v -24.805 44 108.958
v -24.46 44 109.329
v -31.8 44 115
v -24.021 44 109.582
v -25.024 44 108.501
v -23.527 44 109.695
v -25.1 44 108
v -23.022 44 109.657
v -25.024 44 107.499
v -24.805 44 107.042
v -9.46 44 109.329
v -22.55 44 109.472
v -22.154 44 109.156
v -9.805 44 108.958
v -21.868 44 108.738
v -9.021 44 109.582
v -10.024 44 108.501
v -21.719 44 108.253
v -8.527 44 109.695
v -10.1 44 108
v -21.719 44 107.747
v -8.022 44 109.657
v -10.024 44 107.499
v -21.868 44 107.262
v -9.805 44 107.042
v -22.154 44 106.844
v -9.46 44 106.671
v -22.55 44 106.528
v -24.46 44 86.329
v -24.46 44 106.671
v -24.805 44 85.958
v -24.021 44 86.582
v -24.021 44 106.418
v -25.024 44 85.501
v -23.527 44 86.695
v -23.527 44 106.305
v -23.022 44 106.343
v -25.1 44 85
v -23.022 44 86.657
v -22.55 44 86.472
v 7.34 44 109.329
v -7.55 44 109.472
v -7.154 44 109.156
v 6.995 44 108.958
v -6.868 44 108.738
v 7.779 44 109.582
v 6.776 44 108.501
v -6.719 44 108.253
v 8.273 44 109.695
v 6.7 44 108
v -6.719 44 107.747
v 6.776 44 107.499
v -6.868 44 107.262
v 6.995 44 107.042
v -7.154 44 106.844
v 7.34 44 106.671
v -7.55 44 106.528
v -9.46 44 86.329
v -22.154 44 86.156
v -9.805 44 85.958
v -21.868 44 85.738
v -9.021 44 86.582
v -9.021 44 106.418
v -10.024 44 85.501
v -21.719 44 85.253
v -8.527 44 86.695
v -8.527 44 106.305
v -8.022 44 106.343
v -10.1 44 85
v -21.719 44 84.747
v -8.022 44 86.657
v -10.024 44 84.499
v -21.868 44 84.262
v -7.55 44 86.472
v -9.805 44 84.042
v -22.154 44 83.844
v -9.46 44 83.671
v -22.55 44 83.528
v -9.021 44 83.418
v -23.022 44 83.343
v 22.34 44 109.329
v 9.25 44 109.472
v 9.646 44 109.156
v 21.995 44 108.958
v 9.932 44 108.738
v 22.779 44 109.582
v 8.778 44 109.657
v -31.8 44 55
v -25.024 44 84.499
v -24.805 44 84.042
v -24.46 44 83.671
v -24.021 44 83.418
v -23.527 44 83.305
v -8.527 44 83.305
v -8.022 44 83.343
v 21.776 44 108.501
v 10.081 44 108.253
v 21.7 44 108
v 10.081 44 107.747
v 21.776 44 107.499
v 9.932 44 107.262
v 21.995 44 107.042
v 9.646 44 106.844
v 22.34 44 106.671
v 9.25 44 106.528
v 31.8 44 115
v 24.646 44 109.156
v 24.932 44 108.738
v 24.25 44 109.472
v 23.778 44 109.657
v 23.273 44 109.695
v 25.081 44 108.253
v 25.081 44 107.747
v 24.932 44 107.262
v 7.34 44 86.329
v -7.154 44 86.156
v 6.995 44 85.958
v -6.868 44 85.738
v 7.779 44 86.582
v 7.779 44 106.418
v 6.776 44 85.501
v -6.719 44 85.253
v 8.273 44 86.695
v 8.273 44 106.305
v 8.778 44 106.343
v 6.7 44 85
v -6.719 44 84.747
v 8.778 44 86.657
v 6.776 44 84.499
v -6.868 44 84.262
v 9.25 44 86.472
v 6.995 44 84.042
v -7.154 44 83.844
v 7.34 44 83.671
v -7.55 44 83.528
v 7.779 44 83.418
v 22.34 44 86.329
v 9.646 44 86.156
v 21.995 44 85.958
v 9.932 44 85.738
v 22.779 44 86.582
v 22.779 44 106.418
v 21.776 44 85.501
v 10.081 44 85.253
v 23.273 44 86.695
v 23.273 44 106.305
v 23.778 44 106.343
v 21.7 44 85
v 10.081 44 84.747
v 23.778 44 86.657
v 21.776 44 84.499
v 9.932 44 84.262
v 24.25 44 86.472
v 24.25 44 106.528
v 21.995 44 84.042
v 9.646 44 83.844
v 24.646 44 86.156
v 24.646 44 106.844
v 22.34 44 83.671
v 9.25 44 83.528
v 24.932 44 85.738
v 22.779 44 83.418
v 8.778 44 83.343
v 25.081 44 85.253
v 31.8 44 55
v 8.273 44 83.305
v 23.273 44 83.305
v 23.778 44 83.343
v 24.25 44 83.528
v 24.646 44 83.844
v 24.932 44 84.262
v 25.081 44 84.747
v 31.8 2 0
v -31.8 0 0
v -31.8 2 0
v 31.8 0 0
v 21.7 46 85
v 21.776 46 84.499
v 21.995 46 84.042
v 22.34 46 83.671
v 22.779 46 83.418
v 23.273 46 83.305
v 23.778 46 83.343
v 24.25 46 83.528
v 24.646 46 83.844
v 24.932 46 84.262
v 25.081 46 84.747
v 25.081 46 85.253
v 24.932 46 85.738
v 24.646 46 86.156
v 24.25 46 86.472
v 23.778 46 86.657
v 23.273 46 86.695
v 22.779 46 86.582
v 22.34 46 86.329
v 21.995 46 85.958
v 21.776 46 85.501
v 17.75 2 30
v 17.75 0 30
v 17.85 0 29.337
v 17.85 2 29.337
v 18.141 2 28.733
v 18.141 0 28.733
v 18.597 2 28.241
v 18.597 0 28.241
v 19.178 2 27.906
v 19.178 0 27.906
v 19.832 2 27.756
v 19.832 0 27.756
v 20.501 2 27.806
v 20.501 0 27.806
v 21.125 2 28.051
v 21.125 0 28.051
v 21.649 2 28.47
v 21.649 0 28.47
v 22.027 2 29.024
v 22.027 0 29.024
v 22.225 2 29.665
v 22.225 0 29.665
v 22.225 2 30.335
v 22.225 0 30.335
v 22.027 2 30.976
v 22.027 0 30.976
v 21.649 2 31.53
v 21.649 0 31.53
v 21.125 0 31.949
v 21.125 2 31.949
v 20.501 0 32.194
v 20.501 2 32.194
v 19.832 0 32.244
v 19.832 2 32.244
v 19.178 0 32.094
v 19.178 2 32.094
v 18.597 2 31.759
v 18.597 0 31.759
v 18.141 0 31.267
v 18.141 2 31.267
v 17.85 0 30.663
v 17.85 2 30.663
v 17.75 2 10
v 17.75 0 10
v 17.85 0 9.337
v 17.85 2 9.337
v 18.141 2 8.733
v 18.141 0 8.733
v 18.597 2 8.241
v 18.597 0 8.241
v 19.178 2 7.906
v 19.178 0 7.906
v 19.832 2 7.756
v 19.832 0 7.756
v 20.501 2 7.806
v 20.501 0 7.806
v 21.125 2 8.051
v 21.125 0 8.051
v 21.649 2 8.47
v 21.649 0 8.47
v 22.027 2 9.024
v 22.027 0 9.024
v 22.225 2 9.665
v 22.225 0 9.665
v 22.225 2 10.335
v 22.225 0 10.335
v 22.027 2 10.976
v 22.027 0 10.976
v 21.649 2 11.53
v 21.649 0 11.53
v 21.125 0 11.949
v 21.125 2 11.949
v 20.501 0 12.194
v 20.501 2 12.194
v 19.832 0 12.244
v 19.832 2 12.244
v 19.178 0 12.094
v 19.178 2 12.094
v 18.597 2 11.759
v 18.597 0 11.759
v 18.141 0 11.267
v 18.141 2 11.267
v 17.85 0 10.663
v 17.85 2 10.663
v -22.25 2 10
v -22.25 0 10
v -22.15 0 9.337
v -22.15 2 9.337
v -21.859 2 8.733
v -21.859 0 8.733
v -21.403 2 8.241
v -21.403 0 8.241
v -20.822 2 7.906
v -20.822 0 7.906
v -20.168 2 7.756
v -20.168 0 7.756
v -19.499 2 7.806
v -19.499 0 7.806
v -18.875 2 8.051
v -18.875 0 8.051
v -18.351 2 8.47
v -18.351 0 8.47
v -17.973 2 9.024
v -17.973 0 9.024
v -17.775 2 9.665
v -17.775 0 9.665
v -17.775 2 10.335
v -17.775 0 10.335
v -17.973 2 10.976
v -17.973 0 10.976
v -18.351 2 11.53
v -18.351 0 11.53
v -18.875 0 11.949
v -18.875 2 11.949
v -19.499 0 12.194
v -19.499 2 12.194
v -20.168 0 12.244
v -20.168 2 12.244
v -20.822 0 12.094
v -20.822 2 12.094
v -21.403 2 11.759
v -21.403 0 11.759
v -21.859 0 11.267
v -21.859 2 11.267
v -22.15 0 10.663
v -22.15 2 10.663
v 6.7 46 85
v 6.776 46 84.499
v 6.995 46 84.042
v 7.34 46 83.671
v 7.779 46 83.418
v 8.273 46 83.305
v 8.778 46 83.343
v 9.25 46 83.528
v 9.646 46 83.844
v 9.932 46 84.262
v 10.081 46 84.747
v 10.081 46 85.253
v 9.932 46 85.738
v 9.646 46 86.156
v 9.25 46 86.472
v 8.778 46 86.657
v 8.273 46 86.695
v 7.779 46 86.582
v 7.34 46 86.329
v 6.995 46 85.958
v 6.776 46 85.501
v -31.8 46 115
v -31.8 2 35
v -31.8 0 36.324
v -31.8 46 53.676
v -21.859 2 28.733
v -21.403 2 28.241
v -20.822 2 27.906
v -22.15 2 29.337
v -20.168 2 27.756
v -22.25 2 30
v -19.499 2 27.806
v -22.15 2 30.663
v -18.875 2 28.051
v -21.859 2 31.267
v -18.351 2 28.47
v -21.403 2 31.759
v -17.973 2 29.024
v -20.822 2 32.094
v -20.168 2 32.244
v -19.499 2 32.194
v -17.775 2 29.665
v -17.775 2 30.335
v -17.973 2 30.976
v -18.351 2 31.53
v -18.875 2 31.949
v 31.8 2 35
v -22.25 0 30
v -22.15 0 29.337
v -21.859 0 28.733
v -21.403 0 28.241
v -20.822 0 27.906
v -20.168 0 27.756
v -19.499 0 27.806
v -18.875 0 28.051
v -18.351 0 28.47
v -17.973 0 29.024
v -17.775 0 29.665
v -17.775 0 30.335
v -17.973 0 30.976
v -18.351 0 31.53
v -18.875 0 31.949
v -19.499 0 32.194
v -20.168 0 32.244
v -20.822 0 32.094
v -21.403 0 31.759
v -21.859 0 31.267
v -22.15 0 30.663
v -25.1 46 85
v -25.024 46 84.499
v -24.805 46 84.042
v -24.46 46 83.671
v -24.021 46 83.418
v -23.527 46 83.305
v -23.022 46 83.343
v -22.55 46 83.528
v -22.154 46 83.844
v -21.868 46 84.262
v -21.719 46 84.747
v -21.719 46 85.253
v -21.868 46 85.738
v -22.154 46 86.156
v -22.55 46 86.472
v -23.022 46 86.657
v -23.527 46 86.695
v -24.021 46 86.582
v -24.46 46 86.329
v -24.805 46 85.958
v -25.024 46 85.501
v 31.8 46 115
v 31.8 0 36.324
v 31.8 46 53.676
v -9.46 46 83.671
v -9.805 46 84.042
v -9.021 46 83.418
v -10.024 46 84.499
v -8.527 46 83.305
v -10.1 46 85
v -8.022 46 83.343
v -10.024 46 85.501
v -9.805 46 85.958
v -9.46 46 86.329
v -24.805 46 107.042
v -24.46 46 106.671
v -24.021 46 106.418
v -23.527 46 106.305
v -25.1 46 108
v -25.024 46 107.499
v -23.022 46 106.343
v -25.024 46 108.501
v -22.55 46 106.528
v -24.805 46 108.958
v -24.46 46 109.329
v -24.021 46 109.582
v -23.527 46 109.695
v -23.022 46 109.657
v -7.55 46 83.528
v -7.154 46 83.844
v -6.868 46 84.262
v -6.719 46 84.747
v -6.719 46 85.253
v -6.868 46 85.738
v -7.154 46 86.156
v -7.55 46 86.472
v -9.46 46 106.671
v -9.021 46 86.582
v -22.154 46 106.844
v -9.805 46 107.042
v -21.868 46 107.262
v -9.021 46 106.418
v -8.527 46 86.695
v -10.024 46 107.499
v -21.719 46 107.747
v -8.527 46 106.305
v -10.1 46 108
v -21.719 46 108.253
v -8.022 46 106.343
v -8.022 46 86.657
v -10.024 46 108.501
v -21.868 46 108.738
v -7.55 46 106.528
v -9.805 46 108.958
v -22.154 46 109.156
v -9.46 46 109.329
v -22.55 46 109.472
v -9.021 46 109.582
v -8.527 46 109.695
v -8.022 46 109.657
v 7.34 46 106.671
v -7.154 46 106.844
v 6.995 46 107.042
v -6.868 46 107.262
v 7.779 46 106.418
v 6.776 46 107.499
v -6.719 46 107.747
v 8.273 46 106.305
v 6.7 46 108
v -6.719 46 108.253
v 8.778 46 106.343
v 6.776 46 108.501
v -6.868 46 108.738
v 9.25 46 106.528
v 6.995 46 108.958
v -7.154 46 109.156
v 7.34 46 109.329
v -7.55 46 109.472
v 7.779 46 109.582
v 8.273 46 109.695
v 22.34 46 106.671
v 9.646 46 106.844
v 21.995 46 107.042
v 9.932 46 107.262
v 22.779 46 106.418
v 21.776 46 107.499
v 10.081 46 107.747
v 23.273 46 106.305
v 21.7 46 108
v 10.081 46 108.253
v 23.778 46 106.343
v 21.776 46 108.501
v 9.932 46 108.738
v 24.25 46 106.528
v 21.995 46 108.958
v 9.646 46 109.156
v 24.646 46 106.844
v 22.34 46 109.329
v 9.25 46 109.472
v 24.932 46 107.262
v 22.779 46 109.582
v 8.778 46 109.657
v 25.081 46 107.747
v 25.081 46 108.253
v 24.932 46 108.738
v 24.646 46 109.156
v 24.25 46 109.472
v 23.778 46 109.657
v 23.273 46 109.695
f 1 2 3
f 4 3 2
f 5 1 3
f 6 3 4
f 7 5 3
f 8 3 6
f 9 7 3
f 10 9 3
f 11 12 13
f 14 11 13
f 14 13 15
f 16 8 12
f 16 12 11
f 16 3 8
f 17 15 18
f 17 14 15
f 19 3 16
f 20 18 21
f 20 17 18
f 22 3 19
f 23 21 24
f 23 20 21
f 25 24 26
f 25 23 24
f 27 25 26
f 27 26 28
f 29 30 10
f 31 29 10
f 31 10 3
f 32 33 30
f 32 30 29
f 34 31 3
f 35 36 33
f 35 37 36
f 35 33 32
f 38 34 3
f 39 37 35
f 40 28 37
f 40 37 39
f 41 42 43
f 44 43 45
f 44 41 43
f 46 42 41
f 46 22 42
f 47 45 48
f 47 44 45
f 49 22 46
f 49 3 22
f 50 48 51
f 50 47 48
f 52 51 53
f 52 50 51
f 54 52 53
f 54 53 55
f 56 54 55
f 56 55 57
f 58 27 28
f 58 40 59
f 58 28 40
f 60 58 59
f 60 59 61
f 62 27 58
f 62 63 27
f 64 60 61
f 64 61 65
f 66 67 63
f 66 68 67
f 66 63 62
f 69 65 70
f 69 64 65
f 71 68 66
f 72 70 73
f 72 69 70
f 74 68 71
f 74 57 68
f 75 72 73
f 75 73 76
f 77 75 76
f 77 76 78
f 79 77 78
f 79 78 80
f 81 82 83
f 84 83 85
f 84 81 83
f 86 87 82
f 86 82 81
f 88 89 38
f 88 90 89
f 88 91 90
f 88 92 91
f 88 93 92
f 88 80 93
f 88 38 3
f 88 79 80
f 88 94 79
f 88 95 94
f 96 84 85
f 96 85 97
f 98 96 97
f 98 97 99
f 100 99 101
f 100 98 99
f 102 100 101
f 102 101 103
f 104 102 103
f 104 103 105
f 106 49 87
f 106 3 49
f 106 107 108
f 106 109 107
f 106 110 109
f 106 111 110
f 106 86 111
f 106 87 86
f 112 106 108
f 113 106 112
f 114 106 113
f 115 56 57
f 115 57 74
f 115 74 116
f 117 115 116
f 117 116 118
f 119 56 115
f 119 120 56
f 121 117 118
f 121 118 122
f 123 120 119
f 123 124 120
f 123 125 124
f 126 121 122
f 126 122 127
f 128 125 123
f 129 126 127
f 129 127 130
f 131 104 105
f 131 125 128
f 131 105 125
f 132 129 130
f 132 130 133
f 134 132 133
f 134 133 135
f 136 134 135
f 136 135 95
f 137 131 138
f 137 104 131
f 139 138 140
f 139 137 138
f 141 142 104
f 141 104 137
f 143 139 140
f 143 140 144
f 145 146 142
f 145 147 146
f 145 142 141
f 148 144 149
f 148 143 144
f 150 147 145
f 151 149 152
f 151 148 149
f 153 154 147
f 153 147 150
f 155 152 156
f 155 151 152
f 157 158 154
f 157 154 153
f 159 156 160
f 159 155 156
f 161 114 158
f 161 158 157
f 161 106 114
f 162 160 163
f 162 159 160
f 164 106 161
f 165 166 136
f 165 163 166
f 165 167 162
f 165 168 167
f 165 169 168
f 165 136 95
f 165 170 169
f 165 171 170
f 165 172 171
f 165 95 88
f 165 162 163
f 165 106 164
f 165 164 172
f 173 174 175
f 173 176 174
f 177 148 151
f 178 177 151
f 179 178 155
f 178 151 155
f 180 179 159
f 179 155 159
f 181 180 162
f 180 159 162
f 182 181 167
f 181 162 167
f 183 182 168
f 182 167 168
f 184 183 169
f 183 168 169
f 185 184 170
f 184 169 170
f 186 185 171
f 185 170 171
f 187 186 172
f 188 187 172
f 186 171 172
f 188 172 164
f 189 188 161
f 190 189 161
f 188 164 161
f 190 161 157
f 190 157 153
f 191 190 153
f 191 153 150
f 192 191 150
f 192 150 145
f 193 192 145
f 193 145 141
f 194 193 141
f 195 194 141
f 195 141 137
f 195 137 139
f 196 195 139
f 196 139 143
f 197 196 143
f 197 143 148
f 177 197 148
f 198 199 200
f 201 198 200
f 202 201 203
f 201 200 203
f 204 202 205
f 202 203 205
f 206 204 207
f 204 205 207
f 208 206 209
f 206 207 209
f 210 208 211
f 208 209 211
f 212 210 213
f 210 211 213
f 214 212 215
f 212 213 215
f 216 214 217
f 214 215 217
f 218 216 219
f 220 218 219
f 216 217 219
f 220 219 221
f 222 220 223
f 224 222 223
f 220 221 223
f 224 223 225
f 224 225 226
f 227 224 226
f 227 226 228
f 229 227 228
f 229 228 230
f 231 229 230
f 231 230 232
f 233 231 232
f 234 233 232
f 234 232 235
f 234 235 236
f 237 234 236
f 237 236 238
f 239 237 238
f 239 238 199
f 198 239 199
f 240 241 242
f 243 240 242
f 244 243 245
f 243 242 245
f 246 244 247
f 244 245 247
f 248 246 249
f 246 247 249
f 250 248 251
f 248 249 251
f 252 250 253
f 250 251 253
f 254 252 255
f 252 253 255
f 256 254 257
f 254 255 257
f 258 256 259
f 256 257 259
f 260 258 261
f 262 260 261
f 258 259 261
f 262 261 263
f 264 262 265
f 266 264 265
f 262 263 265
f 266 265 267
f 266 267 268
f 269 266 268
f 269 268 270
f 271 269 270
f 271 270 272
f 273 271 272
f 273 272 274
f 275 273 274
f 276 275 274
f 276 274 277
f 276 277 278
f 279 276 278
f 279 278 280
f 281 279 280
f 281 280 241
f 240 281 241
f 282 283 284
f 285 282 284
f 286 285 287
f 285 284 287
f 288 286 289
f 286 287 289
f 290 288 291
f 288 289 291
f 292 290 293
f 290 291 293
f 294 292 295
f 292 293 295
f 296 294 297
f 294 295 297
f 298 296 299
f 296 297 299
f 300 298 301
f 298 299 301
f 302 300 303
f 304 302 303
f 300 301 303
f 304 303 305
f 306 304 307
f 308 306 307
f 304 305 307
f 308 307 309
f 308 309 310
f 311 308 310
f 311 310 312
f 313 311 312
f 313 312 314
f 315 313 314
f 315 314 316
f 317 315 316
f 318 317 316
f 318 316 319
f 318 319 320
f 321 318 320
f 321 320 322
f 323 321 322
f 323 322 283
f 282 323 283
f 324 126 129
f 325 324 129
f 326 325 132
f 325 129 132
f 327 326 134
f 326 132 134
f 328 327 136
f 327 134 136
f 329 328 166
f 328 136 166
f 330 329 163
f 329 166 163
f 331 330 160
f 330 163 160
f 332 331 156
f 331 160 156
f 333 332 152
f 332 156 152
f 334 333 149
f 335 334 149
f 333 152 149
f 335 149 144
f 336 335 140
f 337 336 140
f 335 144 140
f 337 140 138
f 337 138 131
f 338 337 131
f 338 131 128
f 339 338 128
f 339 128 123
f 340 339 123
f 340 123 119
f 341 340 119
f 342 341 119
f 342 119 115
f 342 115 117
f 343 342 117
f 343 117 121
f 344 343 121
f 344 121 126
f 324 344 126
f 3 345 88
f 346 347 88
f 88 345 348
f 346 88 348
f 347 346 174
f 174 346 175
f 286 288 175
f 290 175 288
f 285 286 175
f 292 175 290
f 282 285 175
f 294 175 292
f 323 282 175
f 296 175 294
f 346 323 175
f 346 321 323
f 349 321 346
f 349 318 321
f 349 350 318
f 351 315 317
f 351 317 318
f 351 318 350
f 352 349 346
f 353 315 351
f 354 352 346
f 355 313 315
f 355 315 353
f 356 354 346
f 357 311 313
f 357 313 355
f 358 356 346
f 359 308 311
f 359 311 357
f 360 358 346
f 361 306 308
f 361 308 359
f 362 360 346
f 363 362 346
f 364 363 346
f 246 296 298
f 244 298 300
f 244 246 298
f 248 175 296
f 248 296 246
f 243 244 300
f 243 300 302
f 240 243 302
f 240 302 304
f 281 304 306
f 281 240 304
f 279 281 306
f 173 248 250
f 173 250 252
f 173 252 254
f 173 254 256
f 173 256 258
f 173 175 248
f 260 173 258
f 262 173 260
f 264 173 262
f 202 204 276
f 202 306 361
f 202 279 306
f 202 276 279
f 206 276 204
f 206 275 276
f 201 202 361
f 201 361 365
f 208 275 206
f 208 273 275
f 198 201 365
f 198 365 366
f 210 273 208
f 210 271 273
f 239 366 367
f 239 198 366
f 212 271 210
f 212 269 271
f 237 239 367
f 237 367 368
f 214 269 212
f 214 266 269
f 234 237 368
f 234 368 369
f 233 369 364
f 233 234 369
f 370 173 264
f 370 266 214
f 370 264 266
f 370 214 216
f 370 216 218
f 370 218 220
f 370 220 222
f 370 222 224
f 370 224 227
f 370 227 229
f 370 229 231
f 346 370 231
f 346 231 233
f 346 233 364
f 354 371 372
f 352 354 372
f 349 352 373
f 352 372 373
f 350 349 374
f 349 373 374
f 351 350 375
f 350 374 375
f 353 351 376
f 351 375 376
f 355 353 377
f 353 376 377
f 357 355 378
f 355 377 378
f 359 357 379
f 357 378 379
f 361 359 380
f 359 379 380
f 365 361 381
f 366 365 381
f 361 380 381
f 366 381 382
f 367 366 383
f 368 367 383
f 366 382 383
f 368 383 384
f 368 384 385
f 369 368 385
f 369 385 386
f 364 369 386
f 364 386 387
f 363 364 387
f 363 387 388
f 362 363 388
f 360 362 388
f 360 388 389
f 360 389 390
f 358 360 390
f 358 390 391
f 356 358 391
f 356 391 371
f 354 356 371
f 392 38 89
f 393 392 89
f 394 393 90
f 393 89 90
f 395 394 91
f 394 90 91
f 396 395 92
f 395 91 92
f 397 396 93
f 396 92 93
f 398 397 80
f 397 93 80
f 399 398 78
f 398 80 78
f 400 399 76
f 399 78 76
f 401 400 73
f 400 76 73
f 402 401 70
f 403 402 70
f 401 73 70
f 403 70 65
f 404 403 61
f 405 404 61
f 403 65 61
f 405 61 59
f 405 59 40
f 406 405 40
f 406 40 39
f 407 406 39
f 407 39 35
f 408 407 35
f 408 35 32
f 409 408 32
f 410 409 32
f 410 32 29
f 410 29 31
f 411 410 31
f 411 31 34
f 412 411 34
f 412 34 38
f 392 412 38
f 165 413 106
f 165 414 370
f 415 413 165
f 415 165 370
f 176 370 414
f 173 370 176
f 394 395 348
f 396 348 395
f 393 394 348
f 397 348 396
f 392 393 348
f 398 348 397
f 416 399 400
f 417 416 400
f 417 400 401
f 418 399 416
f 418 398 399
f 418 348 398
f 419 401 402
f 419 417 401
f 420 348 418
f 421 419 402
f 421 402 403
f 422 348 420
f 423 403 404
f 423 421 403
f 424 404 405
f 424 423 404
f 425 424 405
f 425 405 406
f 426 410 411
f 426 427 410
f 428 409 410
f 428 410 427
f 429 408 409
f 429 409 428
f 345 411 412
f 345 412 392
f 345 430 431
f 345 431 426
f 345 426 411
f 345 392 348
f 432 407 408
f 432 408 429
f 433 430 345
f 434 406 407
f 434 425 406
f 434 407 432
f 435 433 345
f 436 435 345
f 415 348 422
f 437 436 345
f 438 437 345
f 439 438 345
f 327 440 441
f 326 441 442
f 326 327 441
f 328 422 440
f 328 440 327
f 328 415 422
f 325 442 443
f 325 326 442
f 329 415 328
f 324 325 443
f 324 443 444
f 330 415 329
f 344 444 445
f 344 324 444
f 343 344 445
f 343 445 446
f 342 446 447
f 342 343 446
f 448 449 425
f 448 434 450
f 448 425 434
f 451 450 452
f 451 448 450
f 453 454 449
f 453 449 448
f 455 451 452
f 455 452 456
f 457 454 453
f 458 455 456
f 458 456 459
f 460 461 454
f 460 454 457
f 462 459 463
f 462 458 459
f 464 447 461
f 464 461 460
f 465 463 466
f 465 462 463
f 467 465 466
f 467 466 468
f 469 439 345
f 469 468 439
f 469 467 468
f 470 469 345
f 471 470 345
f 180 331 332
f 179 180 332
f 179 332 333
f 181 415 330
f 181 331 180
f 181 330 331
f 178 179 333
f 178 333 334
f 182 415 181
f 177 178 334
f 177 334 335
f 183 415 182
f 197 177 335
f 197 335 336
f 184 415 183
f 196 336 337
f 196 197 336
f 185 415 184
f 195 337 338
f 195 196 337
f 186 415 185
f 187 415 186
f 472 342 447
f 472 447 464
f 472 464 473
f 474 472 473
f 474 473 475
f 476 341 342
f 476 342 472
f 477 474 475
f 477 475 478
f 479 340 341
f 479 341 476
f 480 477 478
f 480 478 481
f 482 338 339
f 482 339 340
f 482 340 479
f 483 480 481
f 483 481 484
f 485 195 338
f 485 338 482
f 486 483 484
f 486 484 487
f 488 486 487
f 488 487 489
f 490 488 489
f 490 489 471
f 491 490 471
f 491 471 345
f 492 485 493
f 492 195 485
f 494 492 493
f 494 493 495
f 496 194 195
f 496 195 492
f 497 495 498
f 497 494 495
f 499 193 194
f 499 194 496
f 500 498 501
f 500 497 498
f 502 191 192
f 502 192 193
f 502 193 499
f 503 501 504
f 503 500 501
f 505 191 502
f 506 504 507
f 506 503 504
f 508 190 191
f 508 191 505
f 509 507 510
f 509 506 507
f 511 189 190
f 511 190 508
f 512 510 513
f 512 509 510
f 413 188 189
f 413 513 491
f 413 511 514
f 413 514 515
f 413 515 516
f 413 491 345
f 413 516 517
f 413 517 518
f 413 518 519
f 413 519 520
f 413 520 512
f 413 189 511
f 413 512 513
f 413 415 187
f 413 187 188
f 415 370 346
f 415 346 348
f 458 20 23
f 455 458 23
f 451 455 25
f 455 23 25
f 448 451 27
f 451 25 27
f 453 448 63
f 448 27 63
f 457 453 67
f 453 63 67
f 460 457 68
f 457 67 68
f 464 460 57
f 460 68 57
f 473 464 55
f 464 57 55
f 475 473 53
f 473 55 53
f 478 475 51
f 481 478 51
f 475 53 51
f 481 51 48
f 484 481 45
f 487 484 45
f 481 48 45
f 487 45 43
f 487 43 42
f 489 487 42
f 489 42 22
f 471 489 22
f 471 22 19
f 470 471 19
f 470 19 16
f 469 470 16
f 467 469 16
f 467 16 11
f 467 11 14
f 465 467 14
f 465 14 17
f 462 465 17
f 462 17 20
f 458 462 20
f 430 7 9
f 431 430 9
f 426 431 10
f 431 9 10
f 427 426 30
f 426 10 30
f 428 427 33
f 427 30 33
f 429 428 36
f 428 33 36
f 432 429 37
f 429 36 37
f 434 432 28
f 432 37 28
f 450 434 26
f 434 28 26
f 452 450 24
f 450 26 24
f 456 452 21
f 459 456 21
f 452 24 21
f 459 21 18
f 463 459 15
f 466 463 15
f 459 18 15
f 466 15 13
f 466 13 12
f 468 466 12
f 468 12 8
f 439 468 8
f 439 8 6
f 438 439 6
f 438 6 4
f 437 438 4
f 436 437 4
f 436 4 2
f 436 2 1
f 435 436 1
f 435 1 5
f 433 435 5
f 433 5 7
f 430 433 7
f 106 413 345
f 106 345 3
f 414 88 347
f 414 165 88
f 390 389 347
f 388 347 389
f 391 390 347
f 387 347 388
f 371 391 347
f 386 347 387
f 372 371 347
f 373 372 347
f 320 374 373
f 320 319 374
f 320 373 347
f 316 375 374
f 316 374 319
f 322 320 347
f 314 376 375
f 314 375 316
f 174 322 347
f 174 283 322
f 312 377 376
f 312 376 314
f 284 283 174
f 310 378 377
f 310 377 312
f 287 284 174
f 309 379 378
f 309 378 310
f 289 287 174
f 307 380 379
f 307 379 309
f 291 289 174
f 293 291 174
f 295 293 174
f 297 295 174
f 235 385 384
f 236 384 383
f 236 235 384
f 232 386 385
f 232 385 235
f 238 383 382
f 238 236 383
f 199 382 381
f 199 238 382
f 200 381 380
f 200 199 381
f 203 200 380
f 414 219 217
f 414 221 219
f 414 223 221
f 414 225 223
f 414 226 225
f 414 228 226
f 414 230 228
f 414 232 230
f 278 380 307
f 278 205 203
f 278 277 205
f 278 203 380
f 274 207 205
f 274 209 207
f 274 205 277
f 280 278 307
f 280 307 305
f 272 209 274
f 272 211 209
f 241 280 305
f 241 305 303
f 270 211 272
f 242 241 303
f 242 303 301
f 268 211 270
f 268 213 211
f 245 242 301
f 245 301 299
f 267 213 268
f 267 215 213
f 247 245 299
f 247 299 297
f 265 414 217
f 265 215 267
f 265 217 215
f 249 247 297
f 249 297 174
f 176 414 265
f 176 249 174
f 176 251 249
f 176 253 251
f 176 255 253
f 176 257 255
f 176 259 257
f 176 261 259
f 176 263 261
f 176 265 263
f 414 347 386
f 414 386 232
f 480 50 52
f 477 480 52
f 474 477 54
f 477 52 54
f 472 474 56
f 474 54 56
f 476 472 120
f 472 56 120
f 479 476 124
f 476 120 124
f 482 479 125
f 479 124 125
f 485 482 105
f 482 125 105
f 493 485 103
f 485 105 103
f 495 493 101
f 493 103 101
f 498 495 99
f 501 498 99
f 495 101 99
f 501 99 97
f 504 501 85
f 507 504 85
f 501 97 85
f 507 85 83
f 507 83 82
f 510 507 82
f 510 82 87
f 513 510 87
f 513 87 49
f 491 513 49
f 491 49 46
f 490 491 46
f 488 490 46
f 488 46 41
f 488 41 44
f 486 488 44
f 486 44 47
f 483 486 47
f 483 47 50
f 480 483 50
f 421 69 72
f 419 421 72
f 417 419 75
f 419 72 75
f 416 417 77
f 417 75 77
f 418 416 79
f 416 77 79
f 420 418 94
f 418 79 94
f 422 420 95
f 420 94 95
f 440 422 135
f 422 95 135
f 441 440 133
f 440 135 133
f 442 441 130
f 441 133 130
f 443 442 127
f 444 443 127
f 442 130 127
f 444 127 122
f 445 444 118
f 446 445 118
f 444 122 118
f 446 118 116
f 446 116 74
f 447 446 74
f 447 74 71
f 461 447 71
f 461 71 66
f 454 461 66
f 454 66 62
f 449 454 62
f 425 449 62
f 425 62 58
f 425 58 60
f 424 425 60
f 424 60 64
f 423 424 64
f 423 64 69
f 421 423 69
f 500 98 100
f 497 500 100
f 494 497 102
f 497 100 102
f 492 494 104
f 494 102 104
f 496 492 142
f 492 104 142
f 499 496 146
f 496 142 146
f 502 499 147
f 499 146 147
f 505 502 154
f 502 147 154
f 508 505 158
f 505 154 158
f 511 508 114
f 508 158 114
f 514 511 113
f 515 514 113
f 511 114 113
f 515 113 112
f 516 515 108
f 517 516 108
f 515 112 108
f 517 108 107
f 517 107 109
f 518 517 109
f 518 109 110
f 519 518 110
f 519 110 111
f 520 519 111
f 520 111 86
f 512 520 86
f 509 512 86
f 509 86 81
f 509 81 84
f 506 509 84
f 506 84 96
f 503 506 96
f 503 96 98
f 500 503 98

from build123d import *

# Parameters (mm, degrees)
SHEET_EXTRUDE_DEPTH      = 31.8
M3_CLEARANCE_HOLE1_D     = 3.4
M3_CLEARANCE_HOLE1_DEPTH = 8.5
M3_CLEARANCE_HOLE1_TIP   = 1.021463052
M4_CLEARANCE_HOLE1_D     = 4.5
M4_CLEARANCE_HOLE1_DEPTH = 8.5
M4_CLEARANCE_HOLE1_TIP   = 1.351936393


with BuildPart() as part:
    # Sketch2 → Sheet Extrude (new body, symmetric)
    with BuildSketch(Plane(origin=(0, 0, 0), x_dir=(0, 0, -1), z_dir=(1, 0, 0))):
        Polygon((0, 0), (0, 2), (-35, 2), (-53.676209992, 46), (-115, 46), (-115, 44), (-55, 44), (-36.323790008, 0), align=None)
    extrude(amount=SHEET_EXTRUDE_DEPTH, both=True)

    # M3 Clearance Hole1
    with Locations(Plane(origin=(0, 46, 0), x_dir=(1, 0, 0), z_dir=(0, 1, 0))):
        with Locations((-23.4, -108), (-23.4, -85), (-8.4, -85), (-8.4, -108), (23.4, -108), (8.4, -108), (8.4, -85), (23.4, -85)):
            Hole(M3_CLEARANCE_HOLE1_D / 2, depth=M3_CLEARANCE_HOLE1_DEPTH)
            with Locations((0, 0, -(M3_CLEARANCE_HOLE1_DEPTH + M3_CLEARANCE_HOLE1_TIP / 2))):  # 118° drill point
                Cone(0, M3_CLEARANCE_HOLE1_D / 2, M3_CLEARANCE_HOLE1_TIP, mode=Mode.SUBTRACT)

    # M4 Clearance Hole1
    with Locations(Plane(origin=(0, 2, 0), x_dir=(1, 0, 0), z_dir=(0, 1, 0))):
        with Locations((-20, -30), (20, -30), (20, -10), (-20, -10)):
            Hole(M4_CLEARANCE_HOLE1_D / 2, depth=M4_CLEARANCE_HOLE1_DEPTH)
            with Locations((0, 0, -(M4_CLEARANCE_HOLE1_DEPTH + M4_CLEARANCE_HOLE1_TIP / 2))):  # 118° drill point
                Cone(0, M4_CLEARANCE_HOLE1_D / 2, M4_CLEARANCE_HOLE1_TIP, mode=Mode.SUBTRACT)


solid = part.part
